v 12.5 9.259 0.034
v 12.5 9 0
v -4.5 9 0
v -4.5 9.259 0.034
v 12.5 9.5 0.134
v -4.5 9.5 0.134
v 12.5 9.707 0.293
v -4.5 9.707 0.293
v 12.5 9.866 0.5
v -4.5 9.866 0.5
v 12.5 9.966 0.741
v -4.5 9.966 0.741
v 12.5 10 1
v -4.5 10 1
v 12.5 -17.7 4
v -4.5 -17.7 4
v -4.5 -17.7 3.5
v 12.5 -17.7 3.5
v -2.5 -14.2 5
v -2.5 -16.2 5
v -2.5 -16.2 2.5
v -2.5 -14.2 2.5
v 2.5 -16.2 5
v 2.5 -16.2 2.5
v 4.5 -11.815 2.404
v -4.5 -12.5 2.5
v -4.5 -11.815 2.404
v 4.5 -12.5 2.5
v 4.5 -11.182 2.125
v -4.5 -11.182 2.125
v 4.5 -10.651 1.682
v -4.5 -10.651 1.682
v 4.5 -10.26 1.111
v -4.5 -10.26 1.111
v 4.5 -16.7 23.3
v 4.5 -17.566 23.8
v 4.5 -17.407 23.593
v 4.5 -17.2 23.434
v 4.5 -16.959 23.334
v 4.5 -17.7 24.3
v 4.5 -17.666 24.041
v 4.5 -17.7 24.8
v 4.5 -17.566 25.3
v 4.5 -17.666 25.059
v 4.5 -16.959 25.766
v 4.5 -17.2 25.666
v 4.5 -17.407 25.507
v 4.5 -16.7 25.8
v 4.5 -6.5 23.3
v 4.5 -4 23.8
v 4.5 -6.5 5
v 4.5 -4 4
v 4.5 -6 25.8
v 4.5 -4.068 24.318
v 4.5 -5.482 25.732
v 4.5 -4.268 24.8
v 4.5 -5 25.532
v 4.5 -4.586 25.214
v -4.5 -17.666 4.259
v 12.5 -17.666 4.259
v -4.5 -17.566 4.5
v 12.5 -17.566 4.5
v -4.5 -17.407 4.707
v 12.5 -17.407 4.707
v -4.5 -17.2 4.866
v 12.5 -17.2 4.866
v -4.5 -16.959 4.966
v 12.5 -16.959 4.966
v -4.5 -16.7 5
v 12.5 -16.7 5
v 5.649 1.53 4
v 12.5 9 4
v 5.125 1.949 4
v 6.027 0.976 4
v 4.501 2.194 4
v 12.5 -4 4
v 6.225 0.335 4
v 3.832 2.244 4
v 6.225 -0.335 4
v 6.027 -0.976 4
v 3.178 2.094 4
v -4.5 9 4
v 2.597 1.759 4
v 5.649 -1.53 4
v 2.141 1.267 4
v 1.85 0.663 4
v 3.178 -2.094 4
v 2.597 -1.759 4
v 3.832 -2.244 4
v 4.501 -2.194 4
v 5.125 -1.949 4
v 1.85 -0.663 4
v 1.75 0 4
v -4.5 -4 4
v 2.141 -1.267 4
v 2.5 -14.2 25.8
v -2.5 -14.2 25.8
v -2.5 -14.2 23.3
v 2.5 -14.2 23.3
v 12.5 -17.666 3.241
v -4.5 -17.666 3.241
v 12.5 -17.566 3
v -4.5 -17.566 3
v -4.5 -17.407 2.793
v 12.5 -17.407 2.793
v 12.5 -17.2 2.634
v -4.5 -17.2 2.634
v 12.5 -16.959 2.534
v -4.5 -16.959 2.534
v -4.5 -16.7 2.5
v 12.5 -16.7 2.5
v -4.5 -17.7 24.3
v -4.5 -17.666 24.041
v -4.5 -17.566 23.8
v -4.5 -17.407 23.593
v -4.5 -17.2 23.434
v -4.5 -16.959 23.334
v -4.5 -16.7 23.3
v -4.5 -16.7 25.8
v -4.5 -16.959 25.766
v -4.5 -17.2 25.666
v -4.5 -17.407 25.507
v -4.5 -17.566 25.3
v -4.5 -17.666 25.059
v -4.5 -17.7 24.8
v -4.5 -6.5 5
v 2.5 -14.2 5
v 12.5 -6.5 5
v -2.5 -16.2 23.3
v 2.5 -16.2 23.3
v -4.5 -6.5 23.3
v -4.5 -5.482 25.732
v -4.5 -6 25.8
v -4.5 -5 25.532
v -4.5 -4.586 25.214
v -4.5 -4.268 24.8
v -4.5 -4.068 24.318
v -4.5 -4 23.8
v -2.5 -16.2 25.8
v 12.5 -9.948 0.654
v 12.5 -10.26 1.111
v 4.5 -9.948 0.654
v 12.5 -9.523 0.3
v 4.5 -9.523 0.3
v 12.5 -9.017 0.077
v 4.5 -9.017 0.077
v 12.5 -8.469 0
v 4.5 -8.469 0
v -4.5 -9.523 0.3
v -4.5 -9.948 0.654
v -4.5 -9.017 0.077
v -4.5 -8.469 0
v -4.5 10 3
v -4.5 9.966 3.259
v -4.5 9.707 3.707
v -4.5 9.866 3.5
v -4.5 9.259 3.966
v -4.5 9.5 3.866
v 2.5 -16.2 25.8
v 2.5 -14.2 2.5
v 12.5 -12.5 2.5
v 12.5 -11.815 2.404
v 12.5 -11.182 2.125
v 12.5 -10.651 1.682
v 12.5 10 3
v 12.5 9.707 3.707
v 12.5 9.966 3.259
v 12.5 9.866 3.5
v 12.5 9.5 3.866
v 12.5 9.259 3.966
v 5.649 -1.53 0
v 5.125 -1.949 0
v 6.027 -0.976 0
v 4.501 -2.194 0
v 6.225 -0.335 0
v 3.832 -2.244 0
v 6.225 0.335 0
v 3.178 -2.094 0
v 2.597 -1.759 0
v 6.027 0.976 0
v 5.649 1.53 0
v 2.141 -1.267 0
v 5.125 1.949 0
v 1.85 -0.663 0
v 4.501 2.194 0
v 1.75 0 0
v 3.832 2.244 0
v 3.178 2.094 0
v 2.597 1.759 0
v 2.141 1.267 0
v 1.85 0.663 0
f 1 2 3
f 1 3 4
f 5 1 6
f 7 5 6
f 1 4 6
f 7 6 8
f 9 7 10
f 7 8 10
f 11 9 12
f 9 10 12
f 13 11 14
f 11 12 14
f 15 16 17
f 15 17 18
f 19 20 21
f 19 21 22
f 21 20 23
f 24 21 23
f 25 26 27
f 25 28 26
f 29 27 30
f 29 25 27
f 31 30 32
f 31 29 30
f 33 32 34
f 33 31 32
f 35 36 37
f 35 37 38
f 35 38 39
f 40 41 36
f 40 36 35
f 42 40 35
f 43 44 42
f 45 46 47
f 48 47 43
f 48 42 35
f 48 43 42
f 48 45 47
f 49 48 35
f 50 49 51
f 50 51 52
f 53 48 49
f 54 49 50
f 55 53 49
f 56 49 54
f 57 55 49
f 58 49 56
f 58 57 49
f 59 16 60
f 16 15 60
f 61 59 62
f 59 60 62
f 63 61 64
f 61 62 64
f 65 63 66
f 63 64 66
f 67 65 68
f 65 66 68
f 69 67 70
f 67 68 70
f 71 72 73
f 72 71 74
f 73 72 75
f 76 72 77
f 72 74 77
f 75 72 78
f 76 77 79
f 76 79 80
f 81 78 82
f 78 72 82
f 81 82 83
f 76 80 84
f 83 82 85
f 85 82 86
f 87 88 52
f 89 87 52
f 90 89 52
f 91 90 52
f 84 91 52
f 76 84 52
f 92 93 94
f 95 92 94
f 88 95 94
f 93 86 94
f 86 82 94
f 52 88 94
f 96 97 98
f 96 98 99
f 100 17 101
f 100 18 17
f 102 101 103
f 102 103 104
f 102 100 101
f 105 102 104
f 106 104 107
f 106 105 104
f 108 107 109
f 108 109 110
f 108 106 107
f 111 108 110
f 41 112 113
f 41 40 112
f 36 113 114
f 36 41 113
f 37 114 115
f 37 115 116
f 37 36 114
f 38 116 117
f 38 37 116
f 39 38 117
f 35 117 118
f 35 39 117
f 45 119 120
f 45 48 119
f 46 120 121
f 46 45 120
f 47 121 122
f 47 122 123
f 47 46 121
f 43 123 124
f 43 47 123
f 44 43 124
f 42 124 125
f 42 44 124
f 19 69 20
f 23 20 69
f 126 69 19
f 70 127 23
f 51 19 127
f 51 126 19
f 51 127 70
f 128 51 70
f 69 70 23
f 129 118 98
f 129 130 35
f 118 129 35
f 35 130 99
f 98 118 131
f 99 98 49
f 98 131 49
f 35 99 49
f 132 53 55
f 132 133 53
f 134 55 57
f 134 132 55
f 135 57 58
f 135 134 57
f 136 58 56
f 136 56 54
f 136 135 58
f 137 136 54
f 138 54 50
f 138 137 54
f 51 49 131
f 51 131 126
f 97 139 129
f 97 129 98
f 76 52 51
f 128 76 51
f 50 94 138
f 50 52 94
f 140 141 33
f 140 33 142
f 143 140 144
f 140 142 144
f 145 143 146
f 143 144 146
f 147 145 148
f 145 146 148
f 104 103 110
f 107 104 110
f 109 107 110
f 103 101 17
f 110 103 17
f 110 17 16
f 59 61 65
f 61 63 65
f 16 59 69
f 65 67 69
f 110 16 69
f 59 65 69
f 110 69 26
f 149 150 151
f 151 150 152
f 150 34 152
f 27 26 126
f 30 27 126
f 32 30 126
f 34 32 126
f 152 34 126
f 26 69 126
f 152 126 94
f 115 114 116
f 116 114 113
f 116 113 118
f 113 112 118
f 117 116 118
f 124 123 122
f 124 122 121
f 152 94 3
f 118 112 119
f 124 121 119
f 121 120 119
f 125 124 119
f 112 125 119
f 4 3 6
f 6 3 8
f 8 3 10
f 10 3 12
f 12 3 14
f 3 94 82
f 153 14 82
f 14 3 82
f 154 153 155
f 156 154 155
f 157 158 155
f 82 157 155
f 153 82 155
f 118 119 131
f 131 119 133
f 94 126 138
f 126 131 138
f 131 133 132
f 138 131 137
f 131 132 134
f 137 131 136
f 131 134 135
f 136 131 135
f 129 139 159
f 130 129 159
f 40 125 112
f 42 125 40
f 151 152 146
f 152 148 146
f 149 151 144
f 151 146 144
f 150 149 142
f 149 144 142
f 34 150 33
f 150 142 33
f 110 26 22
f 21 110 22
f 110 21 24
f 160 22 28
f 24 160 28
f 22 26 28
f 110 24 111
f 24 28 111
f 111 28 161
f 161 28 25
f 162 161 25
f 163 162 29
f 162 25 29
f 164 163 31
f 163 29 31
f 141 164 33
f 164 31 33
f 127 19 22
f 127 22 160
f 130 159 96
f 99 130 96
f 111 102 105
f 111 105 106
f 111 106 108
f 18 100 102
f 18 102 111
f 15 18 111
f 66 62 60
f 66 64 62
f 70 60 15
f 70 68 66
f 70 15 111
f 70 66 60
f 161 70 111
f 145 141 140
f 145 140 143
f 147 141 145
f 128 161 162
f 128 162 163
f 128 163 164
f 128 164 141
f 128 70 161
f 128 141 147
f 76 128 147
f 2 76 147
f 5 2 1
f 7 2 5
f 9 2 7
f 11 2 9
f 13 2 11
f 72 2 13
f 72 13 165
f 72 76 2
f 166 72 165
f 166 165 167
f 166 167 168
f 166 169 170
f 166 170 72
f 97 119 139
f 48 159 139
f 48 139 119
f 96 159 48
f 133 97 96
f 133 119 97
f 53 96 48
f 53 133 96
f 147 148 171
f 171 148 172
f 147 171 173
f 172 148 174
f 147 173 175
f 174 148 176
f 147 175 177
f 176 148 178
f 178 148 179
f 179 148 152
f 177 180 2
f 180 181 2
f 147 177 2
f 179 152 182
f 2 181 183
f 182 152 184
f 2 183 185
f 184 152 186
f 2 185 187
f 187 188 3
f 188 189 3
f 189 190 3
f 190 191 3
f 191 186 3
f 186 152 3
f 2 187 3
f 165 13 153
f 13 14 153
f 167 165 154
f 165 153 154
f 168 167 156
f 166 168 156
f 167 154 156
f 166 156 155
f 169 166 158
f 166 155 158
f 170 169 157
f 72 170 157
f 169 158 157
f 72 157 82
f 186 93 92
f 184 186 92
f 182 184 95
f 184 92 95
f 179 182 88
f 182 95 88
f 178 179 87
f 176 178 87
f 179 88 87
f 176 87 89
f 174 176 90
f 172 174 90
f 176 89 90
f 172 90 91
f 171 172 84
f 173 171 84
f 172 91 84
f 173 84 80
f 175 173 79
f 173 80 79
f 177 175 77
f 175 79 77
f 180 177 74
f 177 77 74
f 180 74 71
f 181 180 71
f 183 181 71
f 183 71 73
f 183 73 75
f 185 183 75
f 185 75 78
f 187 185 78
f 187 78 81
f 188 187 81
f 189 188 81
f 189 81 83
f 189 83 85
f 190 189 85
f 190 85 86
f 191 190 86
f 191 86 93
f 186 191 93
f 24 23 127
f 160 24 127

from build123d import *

# Parameters (mm, degrees)
BOSS_EXTRUDE1_DEPTH      = 4.5
FILLET1_R                = 2
BOSS_EXTRUDE2_DEPTH      = 8
M4_CLEARANCE_HOLE1_D     = 4.5
M4_CLEARANCE_HOLE1_DEPTH = 12.4
M4_CLEARANCE_HOLE1_TIP   = 1.351936393
SKETCH9_W                = 9
SKETCH9_H                = 3.5
BOSS_EXTRUDE3_DEPTH      = 2.5
SKETCH10_W               = 17
SKETCH10_H               = 3.5
BOSS_EXTRUDE4_DEPTH      = 2.5
SKETCH11_W               = 5
SKETCH11_H               = 2
CUT_EXTRUDE1_DEPTH       = 26.8
FILLET2_R                = 1


with BuildPart() as part:
    # Sketch3 → Boss-Extrude1 (new body, symmetric)
    with BuildSketch(Plane(origin=(0, 0, 0), x_dir=(0, 0, -1), z_dir=(1, 0, 0))):
        with BuildLine():
            Line((-23.3, -14.200000018), (-23.3, -6.5))
            Line((-23.3, -6.5), (-5, -6.5))
            Line((-5, -6.5), (-5, -14.200000018))
            Line((-5, -14.200000018), (-2.5, -14.200000018))
            Line((-2.5, -14.200000018), (-2.5, -12.5))
            ThreePointArc((-2.5, -12.5), (-1.767766953, -10.732233047), (0, -10))
            Line((0, -10), (0, 10))
            Line((0, 10), (-4, 10))
            Line((-4, 10), (-4, -4))
            Line((-4, -4), (-25.8, -4))
            Line((-25.8, -4), (-25.8, -14.200000018))
            Line((-25.8, -14.200000018), (-23.3, -14.200000018))
        make_face()
    extrude(amount=BOSS_EXTRUDE1_DEPTH, both=True)

    # Fillet1
    fillet1_edges = [part.edges().sort_by_distance(p)[0] for p in [
        (0, -10, 0),
        (0, -4, 25.8),
    ]]
    fillet(fillet1_edges, radius=FILLET1_R)

    # Sketch8 → Boss-Extrude2 (add)
    with BuildSketch(Plane(origin=(4.5, 0, 0), x_dir=(0, 0, -1), z_dir=(1, 0, 0))):
        with BuildLine():
            Line((-4, -4), (-5, -6.5))
            Line((-5, -6.5), (-5, -14.200000018))
            Line((-5, -14.200000018), (-2.5, -14.200000018))
            Line((-2.5, -14.200000018), (-2.5, -12.5))
            ThreePointArc((-2.5, -12.5), (-2.124591464, -11.182384308), (-1.111111111, -10.260483959))
            ThreePointArc((-1.111111111, -10.260483959), (-0.300326829, -9.522963679), (0, -8.468871126))
            Line((0, -8.468871126), (0, 10))
            Line((0, 10), (-4, 10))
            Line((-4, 10), (-4, -4))
        make_face()
    extrude(amount=BOSS_EXTRUDE2_DEPTH)

    # M4 Clearance Hole1
    with Locations(Plane(origin=(0, 0, 0), x_dir=(1, 0, 0), z_dir=(0, 0, -1))):
        with Locations((4, 0)):
            Hole(M4_CLEARANCE_HOLE1_D / 2, depth=M4_CLEARANCE_HOLE1_DEPTH)
            with Locations((0, 0, -(M4_CLEARANCE_HOLE1_DEPTH + M4_CLEARANCE_HOLE1_TIP / 2))):  # 118° drill point
                Cone(0, M4_CLEARANCE_HOLE1_D / 2, M4_CLEARANCE_HOLE1_TIP, mode=Mode.SUBTRACT)

    # Sketch9 → Boss-Extrude3 (add)
    with BuildSketch(Plane.XY.offset(25.8)):
        with Locations((0, -15.950000018)):
            Rectangle(SKETCH9_W, SKETCH9_H)
    extrude(amount=-BOSS_EXTRUDE3_DEPTH)

    # Sketch10 → Boss-Extrude4 (add)
    with BuildSketch(Plane.XY.offset(5)):
        with Locations((4, -15.950000018)):
            Rectangle(SKETCH10_W, SKETCH10_H)
    extrude(amount=-BOSS_EXTRUDE4_DEPTH)

    # Sketch11 → Cut-Extrude1 (cut, through all)
    with BuildSketch(Plane.XY.offset(25.8)):
        with Locations((0, -15.200000018)):
            Rectangle(SKETCH11_W, SKETCH11_H)
    extrude(amount=-CUT_EXTRUDE1_DEPTH, mode=Mode.SUBTRACT)

    # Fillet2
    fillet2_edges = [part.edges().sort_by_distance(p)[0] for p in [
        (4, 10, 0),
        (4, 10, 4),
        (0, -17.700000018, 25.8),
        (0, -17.700000018, 23.3),
        (4, -17.700000018, 5),
        (4, -17.700000018, 2.5),
    ]]
    fillet(fillet2_edges, radius=FILLET2_R)


solid = part.part
